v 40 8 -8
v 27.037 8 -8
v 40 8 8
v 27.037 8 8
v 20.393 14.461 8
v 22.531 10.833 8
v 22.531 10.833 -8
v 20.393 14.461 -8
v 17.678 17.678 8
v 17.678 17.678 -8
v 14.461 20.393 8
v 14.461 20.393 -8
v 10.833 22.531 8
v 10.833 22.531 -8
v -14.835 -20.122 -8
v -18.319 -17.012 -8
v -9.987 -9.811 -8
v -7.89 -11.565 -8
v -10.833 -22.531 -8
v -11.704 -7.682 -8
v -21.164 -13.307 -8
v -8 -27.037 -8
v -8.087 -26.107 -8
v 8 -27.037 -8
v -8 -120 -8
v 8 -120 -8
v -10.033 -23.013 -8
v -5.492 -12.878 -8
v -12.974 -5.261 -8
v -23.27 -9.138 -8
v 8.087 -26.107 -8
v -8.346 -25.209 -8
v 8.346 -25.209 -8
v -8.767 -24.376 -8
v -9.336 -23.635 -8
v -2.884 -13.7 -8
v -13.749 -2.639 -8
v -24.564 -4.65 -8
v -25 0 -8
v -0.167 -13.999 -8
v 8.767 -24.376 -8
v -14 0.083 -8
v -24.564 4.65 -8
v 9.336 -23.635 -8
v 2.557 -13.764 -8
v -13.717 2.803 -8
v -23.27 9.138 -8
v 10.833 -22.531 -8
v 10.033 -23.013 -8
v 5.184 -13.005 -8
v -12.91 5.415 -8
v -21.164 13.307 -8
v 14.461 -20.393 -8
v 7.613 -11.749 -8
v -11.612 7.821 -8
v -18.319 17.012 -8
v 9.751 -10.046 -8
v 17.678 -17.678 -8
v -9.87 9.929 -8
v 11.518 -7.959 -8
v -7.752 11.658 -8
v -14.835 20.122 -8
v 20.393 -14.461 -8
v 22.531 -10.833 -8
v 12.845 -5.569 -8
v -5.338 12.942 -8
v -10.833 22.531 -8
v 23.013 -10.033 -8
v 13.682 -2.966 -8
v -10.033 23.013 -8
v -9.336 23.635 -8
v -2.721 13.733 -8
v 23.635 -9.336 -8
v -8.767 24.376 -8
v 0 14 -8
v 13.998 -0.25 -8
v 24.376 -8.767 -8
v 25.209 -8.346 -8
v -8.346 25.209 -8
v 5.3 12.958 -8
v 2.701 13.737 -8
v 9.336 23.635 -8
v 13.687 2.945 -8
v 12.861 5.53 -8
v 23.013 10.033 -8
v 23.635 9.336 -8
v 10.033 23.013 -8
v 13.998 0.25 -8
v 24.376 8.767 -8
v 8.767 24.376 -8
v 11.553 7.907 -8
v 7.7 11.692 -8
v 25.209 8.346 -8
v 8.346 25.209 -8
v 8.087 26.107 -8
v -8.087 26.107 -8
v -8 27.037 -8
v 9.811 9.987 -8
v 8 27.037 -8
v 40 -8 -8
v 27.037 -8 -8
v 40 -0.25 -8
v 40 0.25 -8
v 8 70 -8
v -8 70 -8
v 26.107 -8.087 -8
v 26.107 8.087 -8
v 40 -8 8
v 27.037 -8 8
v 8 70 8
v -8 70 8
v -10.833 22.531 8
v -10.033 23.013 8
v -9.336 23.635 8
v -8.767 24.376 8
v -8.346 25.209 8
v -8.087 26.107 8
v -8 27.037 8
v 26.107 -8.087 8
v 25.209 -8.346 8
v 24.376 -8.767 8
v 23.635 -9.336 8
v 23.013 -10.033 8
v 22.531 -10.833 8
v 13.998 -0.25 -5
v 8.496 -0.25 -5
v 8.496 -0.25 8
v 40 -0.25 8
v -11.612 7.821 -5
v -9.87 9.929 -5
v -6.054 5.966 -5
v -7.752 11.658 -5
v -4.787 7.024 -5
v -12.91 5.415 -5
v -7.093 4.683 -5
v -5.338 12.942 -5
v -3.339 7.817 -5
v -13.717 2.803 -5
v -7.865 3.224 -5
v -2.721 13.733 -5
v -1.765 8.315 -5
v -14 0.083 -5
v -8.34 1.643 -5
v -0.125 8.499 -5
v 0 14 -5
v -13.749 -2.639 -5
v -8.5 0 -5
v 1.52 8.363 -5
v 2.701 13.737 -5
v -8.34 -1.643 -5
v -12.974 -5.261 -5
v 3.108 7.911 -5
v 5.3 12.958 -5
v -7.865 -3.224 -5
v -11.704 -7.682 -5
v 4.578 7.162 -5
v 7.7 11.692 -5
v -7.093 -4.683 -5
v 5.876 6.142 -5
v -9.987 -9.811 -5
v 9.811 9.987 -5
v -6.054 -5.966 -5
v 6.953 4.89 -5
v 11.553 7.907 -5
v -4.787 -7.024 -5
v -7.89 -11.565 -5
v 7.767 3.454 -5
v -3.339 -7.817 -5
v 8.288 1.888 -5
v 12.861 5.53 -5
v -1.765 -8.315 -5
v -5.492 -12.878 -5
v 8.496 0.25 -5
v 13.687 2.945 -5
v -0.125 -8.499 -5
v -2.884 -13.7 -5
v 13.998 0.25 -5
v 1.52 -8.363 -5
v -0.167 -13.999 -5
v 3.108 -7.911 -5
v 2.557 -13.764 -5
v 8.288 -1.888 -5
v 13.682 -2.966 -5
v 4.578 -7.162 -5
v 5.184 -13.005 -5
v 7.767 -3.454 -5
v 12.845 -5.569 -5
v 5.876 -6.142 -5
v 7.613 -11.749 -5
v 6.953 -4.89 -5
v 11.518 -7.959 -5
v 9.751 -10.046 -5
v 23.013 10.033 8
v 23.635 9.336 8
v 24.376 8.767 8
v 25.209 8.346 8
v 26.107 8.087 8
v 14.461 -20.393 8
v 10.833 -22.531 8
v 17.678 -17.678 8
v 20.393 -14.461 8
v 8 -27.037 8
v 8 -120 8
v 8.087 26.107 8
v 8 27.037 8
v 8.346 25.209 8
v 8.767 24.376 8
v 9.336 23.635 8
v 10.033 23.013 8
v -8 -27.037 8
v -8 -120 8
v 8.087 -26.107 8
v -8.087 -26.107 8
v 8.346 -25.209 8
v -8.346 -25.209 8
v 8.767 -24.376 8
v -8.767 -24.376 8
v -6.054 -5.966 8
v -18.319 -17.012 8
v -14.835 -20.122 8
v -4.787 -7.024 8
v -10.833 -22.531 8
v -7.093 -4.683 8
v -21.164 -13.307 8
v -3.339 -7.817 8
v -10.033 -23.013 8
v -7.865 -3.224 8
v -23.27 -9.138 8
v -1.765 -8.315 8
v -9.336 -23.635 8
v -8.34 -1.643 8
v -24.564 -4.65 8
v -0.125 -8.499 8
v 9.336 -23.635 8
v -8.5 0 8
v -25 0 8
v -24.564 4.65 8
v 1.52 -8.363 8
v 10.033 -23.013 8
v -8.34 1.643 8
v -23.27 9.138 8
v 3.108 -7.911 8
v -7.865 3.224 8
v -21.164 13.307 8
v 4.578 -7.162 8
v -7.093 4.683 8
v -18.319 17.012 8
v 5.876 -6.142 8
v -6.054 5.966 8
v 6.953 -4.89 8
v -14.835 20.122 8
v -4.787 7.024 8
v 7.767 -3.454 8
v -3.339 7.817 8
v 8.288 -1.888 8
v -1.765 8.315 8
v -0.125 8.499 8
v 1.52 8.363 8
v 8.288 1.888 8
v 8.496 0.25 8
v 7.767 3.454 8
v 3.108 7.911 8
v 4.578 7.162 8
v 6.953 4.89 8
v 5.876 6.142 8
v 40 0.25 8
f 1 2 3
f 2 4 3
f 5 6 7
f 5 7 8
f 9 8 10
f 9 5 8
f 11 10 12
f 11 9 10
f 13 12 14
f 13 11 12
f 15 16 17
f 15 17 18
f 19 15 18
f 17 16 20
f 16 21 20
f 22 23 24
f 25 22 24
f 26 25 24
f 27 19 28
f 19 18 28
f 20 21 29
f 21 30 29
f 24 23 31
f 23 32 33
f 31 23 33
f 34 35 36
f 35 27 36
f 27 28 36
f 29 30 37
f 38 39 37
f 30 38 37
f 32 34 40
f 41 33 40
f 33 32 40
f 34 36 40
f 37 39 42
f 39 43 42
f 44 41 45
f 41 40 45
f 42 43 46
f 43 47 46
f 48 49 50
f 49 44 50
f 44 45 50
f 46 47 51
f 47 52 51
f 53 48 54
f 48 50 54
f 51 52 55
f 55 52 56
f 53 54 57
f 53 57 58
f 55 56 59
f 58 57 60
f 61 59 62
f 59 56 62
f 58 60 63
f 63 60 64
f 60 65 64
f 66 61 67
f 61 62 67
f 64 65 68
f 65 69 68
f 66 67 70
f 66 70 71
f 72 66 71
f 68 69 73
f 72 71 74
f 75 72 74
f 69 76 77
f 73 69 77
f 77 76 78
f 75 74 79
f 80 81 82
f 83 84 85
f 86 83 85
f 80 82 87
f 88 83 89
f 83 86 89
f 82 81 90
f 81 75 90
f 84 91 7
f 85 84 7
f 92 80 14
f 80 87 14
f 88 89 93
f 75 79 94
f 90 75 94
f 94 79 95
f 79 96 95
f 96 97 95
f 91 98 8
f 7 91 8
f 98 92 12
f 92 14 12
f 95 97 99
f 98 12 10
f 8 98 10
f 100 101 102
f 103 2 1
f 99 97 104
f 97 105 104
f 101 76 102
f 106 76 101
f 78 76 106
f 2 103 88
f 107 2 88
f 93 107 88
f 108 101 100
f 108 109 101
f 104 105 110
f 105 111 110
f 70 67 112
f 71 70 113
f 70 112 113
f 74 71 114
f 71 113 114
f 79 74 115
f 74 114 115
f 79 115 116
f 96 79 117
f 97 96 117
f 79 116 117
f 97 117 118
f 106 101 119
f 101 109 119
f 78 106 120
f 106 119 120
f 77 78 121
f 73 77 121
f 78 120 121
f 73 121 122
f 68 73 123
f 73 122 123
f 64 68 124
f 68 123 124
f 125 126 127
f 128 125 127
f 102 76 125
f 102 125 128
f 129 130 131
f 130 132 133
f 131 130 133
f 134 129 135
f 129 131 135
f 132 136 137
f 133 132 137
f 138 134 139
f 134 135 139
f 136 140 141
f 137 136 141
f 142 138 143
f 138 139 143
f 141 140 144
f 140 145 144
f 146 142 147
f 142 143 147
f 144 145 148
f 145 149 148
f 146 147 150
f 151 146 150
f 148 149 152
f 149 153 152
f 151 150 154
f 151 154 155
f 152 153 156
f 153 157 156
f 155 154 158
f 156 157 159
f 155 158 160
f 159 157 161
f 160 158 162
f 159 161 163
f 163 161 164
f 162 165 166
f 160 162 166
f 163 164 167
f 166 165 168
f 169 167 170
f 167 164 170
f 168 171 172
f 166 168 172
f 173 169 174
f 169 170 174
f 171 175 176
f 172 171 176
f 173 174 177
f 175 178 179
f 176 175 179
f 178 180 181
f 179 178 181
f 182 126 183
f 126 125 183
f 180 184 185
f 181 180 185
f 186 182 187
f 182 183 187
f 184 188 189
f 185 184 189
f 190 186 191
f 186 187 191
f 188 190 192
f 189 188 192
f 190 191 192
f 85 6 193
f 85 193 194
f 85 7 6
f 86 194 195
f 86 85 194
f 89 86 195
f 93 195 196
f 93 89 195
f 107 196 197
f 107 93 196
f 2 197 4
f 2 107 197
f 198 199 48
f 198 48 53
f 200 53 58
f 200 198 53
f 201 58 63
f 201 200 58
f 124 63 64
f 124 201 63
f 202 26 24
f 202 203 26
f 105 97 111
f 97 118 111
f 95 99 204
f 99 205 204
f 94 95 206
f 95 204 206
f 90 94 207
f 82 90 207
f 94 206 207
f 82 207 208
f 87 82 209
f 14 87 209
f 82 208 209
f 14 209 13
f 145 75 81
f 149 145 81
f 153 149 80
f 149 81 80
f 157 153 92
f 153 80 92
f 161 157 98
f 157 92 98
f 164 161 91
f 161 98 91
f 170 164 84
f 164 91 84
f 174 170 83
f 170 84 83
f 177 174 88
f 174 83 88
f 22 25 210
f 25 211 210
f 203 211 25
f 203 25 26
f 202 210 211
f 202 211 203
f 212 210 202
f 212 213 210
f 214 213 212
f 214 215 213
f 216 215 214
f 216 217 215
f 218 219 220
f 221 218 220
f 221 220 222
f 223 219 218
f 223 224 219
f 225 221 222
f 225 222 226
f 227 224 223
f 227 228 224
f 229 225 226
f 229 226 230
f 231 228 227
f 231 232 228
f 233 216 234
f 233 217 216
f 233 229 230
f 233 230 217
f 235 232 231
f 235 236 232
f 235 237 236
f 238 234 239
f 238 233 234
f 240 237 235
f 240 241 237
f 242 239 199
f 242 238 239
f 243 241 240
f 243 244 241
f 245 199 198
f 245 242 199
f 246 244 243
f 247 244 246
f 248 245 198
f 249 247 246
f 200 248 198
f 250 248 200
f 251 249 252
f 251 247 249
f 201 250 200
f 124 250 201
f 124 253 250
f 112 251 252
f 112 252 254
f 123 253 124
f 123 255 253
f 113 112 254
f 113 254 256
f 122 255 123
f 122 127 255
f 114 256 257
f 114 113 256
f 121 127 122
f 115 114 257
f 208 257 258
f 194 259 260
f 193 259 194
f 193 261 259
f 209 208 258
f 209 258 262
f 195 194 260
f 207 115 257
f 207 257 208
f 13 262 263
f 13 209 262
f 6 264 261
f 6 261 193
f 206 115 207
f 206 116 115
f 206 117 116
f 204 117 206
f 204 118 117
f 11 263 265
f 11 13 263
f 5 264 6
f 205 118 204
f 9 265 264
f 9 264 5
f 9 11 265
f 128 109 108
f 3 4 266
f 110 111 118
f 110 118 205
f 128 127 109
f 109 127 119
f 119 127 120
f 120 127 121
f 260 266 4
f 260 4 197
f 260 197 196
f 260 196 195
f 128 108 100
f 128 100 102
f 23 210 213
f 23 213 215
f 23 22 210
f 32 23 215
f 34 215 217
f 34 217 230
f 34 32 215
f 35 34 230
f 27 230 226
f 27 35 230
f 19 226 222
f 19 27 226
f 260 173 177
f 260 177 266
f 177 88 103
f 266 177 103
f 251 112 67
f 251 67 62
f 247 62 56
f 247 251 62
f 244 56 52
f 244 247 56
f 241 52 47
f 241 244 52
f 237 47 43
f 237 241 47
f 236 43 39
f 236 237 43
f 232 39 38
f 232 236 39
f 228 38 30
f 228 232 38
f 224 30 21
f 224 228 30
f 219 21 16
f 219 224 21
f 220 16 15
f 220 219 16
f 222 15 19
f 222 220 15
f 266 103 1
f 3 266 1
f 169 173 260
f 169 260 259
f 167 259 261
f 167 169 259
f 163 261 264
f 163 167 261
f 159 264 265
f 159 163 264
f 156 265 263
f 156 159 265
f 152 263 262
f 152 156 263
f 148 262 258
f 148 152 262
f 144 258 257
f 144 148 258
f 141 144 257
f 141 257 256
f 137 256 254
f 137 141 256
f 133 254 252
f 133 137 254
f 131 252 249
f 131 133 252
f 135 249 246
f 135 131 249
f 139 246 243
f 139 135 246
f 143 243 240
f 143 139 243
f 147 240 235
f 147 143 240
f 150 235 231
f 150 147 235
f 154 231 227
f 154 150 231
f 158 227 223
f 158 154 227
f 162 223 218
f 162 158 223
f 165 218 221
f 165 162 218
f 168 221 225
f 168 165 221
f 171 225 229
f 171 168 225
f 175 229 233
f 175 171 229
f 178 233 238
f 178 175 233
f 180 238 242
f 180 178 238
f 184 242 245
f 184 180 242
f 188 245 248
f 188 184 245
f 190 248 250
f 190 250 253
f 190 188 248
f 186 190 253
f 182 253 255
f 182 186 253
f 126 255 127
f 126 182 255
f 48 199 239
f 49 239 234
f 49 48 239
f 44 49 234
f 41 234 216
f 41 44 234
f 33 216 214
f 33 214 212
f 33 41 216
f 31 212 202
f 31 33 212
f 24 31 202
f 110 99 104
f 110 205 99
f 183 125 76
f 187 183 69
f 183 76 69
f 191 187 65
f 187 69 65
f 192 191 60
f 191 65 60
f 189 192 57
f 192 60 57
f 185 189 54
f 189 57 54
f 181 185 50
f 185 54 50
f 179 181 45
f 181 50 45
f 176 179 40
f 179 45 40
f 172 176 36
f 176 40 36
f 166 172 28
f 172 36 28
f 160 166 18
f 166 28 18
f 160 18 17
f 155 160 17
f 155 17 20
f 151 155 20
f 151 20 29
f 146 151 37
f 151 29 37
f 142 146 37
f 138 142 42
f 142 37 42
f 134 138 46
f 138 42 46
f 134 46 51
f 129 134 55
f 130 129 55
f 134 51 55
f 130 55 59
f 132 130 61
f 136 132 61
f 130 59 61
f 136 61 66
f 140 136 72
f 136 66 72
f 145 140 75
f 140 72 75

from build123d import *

# Parameters (mm, degrees)
SKETCH1_R               = 25
SKETCH1_R_2             = 8.5
BOSS_EXTRUDE1_DEPTH     = 8
SKETCH2_W               = 16
SKETCH2_H               = 46.314561435
BOSS_EXTRUDE2_DEPTH     = 8
SKETCH3_W               = 16
SKETCH3_H               = 96.314561435
BOSS_EXTRUDE3_DEPTH     = 8
SKETCH4_W               = 16.314561435
SKETCH4_H               = 16
BOSS_EXTRUDE4_DEPTH     = 8
CUT_EXTRUDE1_DEPTH      = 127.743836142
CUT_EXTRUDE1_DEPTH_BACK = 127.743836142
SKETCH5_W               = 48
SKETCH5_H               = 0.5
FILLET1_R               = 5
SKETCH7_W               = 3
SKETCH7_H               = 5.5


with BuildPart() as part:
    # Sketch1 → Boss-Extrude1 (new, symmetric)
    with BuildSketch(Plane.XY):
        Circle(SKETCH1_R)
        Circle(SKETCH1_R_2, mode=Mode.SUBTRACT)
    extrude(amount=BOSS_EXTRUDE1_DEPTH, both=True)

    # Sketch2 → Boss-Extrude2 (add, symmetric)
    with BuildSketch(Plane.XY):
        with Locations((0, 46.842719282)):
            Rectangle(SKETCH2_W, SKETCH2_H)
    extrude(amount=BOSS_EXTRUDE2_DEPTH, both=True)

    # Sketch3 → Boss-Extrude3 (add, symmetric)
    with BuildSketch(Plane.XY):
        with Locations((0, -71.842719283)):
            Rectangle(SKETCH3_W, SKETCH3_H)
    extrude(amount=BOSS_EXTRUDE3_DEPTH, both=True)

    # Sketch4 → Boss-Extrude4 (add, symmetric)
    with BuildSketch(Plane.XY):
        with Locations((31.842719282, 0)):
            Rectangle(SKETCH4_W, SKETCH4_H)
    extrude(amount=BOSS_EXTRUDE4_DEPTH, both=True)

    # Sketch5 → Cut-Extrude1 (cut, two sides: drawn at the far end of the back side and taken through both)
    with BuildSketch(Plane.XY.offset(-CUT_EXTRUDE1_DEPTH_BACK)):
        with Locations((26, 0)):
            Rectangle(SKETCH5_W, SKETCH5_H)
    extrude(amount=CUT_EXTRUDE1_DEPTH + CUT_EXTRUDE1_DEPTH_BACK, mode=Mode.SUBTRACT)

    # Fillet1
    fillet1_edges = [part.edges().sort_by_distance(p)[0] for p in [
        (8, 23.685438565, 0),
        (-8, 23.685438565, 0),
        (8, -23.685438565, 0),
        (-8, -23.685438565, 0),
        (23.685438565, -8, 0),
        (23.685438565, 8, 0),
    ]]
    fillet(fillet1_edges, radius=FILLET1_R)

    # Sketch7 → Cut-Revolve1 (revolve, cut)
    with BuildSketch(Plane(origin=(0, 0, 0), x_dir=(0, 0, -1), z_dir=(1, 0, 0))):
        with Locations((6.5, 11.25)):
            Rectangle(SKETCH7_W, SKETCH7_H)
    revolve(axis=Axis((0, 0, 0), (0, 0, -1)), mode=Mode.SUBTRACT)


solid = part.part
